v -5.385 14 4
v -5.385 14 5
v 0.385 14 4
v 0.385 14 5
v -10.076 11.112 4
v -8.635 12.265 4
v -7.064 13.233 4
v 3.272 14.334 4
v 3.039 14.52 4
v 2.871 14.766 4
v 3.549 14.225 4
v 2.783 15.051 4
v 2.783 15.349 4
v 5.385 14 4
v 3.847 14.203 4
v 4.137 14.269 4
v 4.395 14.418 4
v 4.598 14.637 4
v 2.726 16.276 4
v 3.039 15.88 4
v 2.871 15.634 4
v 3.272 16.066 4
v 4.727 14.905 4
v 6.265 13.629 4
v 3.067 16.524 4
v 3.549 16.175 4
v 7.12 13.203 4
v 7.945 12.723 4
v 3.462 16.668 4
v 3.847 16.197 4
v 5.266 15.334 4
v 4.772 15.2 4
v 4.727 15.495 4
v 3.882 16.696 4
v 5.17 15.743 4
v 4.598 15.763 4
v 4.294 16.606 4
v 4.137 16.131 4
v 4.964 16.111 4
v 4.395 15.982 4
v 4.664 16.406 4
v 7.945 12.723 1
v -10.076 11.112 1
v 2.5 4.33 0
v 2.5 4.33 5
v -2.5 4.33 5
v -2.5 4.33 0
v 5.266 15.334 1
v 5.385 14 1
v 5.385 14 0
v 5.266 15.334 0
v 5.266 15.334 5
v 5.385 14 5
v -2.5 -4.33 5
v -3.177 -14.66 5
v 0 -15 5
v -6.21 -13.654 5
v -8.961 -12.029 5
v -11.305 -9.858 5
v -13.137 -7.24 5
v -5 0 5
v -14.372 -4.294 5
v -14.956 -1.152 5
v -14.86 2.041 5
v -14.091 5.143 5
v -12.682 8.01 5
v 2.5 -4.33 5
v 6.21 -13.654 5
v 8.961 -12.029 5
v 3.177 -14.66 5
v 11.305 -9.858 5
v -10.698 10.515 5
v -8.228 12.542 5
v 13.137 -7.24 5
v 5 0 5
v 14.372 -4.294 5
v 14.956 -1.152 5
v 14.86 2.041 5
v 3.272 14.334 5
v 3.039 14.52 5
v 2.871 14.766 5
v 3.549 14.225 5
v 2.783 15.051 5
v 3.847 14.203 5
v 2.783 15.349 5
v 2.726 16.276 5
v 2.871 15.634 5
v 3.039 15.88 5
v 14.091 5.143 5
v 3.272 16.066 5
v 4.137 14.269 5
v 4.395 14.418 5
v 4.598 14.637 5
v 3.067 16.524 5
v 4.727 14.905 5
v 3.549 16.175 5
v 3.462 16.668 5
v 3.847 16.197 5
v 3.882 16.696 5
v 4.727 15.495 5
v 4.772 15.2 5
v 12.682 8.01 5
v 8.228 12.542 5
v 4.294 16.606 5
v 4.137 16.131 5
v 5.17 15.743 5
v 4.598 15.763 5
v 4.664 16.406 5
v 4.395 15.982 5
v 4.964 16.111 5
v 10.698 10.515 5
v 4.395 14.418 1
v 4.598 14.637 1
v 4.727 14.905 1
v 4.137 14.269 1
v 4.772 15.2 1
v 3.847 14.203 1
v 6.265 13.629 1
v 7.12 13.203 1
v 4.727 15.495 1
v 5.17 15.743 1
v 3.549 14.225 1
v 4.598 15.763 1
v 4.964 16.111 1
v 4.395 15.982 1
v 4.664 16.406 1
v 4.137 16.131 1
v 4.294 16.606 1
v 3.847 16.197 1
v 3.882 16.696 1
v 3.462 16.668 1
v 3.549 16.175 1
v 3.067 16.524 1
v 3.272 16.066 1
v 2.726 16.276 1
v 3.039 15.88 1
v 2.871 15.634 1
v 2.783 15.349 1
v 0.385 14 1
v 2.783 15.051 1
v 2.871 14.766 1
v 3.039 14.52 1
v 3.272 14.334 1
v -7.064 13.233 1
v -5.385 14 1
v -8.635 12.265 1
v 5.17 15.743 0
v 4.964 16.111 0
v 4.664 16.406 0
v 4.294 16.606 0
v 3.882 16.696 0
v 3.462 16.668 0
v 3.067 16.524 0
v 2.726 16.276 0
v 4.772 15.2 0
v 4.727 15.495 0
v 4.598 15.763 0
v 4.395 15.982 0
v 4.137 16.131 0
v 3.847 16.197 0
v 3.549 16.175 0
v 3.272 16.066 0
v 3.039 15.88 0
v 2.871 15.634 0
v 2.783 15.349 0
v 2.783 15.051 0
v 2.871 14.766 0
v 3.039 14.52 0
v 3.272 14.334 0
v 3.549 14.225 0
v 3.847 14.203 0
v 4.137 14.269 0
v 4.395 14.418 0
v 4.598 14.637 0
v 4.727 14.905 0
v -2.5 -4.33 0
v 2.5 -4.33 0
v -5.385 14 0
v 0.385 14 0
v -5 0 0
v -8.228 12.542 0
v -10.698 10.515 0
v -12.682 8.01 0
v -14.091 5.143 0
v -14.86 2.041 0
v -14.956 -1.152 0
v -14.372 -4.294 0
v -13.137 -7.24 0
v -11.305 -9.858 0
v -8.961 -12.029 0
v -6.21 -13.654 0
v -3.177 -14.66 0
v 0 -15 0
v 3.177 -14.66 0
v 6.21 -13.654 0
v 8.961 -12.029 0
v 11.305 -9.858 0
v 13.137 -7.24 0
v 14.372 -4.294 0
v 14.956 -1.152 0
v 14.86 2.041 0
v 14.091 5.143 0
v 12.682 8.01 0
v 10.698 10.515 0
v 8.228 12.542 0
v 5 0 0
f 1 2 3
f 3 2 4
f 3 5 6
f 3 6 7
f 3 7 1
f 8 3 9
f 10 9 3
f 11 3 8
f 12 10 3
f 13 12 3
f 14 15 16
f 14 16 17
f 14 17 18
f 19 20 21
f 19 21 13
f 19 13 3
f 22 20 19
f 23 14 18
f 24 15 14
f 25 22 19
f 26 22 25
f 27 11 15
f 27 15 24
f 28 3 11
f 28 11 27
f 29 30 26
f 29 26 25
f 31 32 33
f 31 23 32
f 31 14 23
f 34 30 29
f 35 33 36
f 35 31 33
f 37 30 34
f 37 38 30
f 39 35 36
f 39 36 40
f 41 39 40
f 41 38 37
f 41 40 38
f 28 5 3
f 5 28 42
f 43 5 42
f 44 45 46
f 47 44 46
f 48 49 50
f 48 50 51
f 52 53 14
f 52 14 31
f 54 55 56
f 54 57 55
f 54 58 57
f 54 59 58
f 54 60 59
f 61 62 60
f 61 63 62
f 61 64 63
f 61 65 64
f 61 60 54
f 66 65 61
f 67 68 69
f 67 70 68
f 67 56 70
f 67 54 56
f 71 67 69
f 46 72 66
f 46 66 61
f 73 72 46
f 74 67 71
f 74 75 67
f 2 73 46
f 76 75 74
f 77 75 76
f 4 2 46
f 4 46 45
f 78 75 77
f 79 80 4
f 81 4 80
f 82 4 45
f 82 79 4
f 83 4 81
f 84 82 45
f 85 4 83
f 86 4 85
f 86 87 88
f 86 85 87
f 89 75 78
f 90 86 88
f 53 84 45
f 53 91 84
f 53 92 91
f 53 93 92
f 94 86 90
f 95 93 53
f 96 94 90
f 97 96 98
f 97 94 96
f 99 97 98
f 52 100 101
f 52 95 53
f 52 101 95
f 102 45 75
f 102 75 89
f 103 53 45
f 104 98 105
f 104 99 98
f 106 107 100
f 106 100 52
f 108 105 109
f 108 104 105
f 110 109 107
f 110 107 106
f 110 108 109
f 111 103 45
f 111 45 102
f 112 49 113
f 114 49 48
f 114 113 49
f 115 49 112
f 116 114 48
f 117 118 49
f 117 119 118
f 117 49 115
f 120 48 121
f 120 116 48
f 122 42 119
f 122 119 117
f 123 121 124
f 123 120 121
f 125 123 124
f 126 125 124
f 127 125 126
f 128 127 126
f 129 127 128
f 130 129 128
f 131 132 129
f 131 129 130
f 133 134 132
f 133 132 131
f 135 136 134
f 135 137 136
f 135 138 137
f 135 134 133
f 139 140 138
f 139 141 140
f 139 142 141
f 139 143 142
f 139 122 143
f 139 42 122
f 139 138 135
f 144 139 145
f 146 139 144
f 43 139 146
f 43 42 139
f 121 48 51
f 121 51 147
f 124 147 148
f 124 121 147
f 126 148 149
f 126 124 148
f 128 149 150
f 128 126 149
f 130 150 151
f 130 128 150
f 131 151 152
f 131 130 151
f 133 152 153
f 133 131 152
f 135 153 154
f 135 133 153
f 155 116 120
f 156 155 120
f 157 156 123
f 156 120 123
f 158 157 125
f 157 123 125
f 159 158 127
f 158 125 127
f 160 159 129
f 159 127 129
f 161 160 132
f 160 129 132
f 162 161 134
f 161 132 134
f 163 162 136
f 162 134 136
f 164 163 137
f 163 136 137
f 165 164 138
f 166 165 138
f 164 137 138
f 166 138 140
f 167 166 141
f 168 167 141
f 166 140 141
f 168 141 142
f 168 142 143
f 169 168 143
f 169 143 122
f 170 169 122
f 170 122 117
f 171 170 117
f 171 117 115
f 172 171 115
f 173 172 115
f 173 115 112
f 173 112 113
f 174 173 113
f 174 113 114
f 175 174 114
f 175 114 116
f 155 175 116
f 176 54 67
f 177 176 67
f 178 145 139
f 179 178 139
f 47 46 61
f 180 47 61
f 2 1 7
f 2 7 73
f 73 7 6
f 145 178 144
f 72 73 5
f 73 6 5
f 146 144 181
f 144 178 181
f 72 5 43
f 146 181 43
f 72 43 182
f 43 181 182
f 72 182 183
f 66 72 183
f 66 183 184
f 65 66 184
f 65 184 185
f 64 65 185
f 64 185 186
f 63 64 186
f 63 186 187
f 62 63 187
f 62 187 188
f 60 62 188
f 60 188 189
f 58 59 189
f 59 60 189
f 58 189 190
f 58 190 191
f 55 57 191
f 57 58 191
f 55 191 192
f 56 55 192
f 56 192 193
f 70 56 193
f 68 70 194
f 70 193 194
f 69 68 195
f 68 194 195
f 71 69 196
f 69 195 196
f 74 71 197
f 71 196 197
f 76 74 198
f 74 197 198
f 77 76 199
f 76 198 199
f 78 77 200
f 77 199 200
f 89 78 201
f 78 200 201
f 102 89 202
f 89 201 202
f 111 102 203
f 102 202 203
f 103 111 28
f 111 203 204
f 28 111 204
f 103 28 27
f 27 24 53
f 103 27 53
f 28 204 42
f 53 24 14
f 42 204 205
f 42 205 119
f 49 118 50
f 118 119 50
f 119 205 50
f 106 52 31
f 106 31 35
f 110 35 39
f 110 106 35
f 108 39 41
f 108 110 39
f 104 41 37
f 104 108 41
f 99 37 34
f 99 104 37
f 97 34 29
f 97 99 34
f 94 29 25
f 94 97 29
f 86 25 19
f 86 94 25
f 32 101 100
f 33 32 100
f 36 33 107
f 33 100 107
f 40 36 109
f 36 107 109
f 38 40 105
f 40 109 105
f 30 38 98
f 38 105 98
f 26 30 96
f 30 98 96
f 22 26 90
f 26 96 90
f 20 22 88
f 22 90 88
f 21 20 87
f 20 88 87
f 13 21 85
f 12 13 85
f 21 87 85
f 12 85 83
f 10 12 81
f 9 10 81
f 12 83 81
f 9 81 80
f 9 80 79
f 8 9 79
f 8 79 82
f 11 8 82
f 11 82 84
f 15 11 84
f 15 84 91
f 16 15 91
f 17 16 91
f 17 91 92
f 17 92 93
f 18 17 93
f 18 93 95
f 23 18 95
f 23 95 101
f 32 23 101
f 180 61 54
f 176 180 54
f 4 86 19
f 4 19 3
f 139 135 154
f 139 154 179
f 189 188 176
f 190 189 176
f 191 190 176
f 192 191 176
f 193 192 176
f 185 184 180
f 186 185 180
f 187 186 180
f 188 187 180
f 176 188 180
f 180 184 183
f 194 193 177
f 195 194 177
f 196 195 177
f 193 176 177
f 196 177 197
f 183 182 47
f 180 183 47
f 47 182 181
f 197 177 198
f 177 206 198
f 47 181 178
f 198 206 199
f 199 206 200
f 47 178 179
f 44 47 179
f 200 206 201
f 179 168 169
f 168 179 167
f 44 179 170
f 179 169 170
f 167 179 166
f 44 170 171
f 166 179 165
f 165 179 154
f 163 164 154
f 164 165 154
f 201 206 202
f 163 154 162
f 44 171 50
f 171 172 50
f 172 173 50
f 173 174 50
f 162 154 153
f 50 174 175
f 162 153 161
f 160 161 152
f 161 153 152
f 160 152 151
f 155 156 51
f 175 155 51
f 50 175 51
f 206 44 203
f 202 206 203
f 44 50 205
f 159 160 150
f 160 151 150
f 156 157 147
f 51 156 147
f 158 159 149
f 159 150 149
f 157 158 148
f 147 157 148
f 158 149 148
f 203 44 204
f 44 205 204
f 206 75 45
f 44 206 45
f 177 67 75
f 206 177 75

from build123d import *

# Parameters (mm, degrees)
SKETCH_1_R               = 15
EXTRUDE_1_DEPTH          = 5
CUT_EXTRUDE_1_DEPTH      = 30
CUT_EXTRUDE_2_DEPTH      = 60
SKETCH_4_R               = 1
EXTRUDE_2_DEPTH          = 5
SKETCH_5_W               = 3
SKETCH_5_H               = 5.040496026
CUT_EXTRUDE_3_DEPTH      = 28.39432933
CUT_EXTRUDE_4_DEPTH      = 28.39432933
CUT_EXTRUDE_4_DEPTH_BACK = 28.39432933
SKETCH_6_W               = 3
SKETCH_6_H               = 1.5


with BuildPart() as part:
    # 草图1 → 凸台-拉伸1 (new body)
    with BuildSketch(Plane.XY):
        Circle(SKETCH_1_R)
    extrude(amount=EXTRUDE_1_DEPTH)

    # 草图2 → 切除-拉伸1 (cut)
    with BuildSketch(Plane.XY.offset(5)):
        Polygon((-2.5, -4.330127019), (2.5, -4.330127019), (5, 0), (2.5, 4.330127019), (-2.5, 4.330127019), (-5, 0), align=None)
    extrude(amount=-CUT_EXTRUDE_1_DEPTH, mode=Mode.SUBTRACT)

    # 草图3 → 切除-拉伸2 (cut)
    with BuildSketch(Plane.XY.offset(5)):
        Polygon((-8.586571111, 14), (9.123789919, 14), (-0.951474436, 18.675160858), align=None)
    extrude(amount=-CUT_EXTRUDE_2_DEPTH, mode=Mode.SUBTRACT)

    # 草图4 → 凸台-拉伸2 (add)
    with BuildSketch(Plane.XY.offset(5)):
        with BuildLine():
            Line((5.385164807, 14), (5.26595559, 15.333555474))
            ThreePointArc((5.26595559, 15.333555474), (4.293622117, 16.606349783), (2.726438877, 16.275631735))
            Line((2.726438877, 16.275631735), (0.385164807, 14))
            Line((0.385164807, 14), (5.385164807, 14))
        make_face()
        with Locations((3.771913109, 15.2)):
            Circle(SKETCH_4_R, mode=Mode.SUBTRACT)
    extrude(amount=-EXTRUDE_2_DEPTH)

    # 草图5 → 切除-拉伸3 (cut, through all)
    with BuildSketch(Plane(origin=(6.584040452, 0.588560672, 0), x_dir=(0, 0, -1), z_dir=(0.996028320712149, 0.08903698298648982, 0))):
        with Locations((-2.5, 15.985165676)):
            Rectangle(SKETCH_5_W, SKETCH_5_H)
    extrude(amount=-CUT_EXTRUDE_3_DEPTH, mode=Mode.SUBTRACT)

    # 草图6 → 切除-拉伸4 (cut, two sides: drawn at the far end of the back side and taken through both)
    with BuildSketch(Plane(origin=(6.584040452, 0.588560672, 0), x_dir=(0, 0, -1), z_dir=(0.996028320712149, 0.08903698298649015, 0)).offset(-CUT_EXTRUDE_4_DEPTH_BACK)):
        with Locations((-2.5, 12.714917663)):
            Rectangle(SKETCH_6_W, SKETCH_6_H)
    extrude(amount=CUT_EXTRUDE_4_DEPTH + CUT_EXTRUDE_4_DEPTH_BACK, mode=Mode.SUBTRACT)


solid = part.part
